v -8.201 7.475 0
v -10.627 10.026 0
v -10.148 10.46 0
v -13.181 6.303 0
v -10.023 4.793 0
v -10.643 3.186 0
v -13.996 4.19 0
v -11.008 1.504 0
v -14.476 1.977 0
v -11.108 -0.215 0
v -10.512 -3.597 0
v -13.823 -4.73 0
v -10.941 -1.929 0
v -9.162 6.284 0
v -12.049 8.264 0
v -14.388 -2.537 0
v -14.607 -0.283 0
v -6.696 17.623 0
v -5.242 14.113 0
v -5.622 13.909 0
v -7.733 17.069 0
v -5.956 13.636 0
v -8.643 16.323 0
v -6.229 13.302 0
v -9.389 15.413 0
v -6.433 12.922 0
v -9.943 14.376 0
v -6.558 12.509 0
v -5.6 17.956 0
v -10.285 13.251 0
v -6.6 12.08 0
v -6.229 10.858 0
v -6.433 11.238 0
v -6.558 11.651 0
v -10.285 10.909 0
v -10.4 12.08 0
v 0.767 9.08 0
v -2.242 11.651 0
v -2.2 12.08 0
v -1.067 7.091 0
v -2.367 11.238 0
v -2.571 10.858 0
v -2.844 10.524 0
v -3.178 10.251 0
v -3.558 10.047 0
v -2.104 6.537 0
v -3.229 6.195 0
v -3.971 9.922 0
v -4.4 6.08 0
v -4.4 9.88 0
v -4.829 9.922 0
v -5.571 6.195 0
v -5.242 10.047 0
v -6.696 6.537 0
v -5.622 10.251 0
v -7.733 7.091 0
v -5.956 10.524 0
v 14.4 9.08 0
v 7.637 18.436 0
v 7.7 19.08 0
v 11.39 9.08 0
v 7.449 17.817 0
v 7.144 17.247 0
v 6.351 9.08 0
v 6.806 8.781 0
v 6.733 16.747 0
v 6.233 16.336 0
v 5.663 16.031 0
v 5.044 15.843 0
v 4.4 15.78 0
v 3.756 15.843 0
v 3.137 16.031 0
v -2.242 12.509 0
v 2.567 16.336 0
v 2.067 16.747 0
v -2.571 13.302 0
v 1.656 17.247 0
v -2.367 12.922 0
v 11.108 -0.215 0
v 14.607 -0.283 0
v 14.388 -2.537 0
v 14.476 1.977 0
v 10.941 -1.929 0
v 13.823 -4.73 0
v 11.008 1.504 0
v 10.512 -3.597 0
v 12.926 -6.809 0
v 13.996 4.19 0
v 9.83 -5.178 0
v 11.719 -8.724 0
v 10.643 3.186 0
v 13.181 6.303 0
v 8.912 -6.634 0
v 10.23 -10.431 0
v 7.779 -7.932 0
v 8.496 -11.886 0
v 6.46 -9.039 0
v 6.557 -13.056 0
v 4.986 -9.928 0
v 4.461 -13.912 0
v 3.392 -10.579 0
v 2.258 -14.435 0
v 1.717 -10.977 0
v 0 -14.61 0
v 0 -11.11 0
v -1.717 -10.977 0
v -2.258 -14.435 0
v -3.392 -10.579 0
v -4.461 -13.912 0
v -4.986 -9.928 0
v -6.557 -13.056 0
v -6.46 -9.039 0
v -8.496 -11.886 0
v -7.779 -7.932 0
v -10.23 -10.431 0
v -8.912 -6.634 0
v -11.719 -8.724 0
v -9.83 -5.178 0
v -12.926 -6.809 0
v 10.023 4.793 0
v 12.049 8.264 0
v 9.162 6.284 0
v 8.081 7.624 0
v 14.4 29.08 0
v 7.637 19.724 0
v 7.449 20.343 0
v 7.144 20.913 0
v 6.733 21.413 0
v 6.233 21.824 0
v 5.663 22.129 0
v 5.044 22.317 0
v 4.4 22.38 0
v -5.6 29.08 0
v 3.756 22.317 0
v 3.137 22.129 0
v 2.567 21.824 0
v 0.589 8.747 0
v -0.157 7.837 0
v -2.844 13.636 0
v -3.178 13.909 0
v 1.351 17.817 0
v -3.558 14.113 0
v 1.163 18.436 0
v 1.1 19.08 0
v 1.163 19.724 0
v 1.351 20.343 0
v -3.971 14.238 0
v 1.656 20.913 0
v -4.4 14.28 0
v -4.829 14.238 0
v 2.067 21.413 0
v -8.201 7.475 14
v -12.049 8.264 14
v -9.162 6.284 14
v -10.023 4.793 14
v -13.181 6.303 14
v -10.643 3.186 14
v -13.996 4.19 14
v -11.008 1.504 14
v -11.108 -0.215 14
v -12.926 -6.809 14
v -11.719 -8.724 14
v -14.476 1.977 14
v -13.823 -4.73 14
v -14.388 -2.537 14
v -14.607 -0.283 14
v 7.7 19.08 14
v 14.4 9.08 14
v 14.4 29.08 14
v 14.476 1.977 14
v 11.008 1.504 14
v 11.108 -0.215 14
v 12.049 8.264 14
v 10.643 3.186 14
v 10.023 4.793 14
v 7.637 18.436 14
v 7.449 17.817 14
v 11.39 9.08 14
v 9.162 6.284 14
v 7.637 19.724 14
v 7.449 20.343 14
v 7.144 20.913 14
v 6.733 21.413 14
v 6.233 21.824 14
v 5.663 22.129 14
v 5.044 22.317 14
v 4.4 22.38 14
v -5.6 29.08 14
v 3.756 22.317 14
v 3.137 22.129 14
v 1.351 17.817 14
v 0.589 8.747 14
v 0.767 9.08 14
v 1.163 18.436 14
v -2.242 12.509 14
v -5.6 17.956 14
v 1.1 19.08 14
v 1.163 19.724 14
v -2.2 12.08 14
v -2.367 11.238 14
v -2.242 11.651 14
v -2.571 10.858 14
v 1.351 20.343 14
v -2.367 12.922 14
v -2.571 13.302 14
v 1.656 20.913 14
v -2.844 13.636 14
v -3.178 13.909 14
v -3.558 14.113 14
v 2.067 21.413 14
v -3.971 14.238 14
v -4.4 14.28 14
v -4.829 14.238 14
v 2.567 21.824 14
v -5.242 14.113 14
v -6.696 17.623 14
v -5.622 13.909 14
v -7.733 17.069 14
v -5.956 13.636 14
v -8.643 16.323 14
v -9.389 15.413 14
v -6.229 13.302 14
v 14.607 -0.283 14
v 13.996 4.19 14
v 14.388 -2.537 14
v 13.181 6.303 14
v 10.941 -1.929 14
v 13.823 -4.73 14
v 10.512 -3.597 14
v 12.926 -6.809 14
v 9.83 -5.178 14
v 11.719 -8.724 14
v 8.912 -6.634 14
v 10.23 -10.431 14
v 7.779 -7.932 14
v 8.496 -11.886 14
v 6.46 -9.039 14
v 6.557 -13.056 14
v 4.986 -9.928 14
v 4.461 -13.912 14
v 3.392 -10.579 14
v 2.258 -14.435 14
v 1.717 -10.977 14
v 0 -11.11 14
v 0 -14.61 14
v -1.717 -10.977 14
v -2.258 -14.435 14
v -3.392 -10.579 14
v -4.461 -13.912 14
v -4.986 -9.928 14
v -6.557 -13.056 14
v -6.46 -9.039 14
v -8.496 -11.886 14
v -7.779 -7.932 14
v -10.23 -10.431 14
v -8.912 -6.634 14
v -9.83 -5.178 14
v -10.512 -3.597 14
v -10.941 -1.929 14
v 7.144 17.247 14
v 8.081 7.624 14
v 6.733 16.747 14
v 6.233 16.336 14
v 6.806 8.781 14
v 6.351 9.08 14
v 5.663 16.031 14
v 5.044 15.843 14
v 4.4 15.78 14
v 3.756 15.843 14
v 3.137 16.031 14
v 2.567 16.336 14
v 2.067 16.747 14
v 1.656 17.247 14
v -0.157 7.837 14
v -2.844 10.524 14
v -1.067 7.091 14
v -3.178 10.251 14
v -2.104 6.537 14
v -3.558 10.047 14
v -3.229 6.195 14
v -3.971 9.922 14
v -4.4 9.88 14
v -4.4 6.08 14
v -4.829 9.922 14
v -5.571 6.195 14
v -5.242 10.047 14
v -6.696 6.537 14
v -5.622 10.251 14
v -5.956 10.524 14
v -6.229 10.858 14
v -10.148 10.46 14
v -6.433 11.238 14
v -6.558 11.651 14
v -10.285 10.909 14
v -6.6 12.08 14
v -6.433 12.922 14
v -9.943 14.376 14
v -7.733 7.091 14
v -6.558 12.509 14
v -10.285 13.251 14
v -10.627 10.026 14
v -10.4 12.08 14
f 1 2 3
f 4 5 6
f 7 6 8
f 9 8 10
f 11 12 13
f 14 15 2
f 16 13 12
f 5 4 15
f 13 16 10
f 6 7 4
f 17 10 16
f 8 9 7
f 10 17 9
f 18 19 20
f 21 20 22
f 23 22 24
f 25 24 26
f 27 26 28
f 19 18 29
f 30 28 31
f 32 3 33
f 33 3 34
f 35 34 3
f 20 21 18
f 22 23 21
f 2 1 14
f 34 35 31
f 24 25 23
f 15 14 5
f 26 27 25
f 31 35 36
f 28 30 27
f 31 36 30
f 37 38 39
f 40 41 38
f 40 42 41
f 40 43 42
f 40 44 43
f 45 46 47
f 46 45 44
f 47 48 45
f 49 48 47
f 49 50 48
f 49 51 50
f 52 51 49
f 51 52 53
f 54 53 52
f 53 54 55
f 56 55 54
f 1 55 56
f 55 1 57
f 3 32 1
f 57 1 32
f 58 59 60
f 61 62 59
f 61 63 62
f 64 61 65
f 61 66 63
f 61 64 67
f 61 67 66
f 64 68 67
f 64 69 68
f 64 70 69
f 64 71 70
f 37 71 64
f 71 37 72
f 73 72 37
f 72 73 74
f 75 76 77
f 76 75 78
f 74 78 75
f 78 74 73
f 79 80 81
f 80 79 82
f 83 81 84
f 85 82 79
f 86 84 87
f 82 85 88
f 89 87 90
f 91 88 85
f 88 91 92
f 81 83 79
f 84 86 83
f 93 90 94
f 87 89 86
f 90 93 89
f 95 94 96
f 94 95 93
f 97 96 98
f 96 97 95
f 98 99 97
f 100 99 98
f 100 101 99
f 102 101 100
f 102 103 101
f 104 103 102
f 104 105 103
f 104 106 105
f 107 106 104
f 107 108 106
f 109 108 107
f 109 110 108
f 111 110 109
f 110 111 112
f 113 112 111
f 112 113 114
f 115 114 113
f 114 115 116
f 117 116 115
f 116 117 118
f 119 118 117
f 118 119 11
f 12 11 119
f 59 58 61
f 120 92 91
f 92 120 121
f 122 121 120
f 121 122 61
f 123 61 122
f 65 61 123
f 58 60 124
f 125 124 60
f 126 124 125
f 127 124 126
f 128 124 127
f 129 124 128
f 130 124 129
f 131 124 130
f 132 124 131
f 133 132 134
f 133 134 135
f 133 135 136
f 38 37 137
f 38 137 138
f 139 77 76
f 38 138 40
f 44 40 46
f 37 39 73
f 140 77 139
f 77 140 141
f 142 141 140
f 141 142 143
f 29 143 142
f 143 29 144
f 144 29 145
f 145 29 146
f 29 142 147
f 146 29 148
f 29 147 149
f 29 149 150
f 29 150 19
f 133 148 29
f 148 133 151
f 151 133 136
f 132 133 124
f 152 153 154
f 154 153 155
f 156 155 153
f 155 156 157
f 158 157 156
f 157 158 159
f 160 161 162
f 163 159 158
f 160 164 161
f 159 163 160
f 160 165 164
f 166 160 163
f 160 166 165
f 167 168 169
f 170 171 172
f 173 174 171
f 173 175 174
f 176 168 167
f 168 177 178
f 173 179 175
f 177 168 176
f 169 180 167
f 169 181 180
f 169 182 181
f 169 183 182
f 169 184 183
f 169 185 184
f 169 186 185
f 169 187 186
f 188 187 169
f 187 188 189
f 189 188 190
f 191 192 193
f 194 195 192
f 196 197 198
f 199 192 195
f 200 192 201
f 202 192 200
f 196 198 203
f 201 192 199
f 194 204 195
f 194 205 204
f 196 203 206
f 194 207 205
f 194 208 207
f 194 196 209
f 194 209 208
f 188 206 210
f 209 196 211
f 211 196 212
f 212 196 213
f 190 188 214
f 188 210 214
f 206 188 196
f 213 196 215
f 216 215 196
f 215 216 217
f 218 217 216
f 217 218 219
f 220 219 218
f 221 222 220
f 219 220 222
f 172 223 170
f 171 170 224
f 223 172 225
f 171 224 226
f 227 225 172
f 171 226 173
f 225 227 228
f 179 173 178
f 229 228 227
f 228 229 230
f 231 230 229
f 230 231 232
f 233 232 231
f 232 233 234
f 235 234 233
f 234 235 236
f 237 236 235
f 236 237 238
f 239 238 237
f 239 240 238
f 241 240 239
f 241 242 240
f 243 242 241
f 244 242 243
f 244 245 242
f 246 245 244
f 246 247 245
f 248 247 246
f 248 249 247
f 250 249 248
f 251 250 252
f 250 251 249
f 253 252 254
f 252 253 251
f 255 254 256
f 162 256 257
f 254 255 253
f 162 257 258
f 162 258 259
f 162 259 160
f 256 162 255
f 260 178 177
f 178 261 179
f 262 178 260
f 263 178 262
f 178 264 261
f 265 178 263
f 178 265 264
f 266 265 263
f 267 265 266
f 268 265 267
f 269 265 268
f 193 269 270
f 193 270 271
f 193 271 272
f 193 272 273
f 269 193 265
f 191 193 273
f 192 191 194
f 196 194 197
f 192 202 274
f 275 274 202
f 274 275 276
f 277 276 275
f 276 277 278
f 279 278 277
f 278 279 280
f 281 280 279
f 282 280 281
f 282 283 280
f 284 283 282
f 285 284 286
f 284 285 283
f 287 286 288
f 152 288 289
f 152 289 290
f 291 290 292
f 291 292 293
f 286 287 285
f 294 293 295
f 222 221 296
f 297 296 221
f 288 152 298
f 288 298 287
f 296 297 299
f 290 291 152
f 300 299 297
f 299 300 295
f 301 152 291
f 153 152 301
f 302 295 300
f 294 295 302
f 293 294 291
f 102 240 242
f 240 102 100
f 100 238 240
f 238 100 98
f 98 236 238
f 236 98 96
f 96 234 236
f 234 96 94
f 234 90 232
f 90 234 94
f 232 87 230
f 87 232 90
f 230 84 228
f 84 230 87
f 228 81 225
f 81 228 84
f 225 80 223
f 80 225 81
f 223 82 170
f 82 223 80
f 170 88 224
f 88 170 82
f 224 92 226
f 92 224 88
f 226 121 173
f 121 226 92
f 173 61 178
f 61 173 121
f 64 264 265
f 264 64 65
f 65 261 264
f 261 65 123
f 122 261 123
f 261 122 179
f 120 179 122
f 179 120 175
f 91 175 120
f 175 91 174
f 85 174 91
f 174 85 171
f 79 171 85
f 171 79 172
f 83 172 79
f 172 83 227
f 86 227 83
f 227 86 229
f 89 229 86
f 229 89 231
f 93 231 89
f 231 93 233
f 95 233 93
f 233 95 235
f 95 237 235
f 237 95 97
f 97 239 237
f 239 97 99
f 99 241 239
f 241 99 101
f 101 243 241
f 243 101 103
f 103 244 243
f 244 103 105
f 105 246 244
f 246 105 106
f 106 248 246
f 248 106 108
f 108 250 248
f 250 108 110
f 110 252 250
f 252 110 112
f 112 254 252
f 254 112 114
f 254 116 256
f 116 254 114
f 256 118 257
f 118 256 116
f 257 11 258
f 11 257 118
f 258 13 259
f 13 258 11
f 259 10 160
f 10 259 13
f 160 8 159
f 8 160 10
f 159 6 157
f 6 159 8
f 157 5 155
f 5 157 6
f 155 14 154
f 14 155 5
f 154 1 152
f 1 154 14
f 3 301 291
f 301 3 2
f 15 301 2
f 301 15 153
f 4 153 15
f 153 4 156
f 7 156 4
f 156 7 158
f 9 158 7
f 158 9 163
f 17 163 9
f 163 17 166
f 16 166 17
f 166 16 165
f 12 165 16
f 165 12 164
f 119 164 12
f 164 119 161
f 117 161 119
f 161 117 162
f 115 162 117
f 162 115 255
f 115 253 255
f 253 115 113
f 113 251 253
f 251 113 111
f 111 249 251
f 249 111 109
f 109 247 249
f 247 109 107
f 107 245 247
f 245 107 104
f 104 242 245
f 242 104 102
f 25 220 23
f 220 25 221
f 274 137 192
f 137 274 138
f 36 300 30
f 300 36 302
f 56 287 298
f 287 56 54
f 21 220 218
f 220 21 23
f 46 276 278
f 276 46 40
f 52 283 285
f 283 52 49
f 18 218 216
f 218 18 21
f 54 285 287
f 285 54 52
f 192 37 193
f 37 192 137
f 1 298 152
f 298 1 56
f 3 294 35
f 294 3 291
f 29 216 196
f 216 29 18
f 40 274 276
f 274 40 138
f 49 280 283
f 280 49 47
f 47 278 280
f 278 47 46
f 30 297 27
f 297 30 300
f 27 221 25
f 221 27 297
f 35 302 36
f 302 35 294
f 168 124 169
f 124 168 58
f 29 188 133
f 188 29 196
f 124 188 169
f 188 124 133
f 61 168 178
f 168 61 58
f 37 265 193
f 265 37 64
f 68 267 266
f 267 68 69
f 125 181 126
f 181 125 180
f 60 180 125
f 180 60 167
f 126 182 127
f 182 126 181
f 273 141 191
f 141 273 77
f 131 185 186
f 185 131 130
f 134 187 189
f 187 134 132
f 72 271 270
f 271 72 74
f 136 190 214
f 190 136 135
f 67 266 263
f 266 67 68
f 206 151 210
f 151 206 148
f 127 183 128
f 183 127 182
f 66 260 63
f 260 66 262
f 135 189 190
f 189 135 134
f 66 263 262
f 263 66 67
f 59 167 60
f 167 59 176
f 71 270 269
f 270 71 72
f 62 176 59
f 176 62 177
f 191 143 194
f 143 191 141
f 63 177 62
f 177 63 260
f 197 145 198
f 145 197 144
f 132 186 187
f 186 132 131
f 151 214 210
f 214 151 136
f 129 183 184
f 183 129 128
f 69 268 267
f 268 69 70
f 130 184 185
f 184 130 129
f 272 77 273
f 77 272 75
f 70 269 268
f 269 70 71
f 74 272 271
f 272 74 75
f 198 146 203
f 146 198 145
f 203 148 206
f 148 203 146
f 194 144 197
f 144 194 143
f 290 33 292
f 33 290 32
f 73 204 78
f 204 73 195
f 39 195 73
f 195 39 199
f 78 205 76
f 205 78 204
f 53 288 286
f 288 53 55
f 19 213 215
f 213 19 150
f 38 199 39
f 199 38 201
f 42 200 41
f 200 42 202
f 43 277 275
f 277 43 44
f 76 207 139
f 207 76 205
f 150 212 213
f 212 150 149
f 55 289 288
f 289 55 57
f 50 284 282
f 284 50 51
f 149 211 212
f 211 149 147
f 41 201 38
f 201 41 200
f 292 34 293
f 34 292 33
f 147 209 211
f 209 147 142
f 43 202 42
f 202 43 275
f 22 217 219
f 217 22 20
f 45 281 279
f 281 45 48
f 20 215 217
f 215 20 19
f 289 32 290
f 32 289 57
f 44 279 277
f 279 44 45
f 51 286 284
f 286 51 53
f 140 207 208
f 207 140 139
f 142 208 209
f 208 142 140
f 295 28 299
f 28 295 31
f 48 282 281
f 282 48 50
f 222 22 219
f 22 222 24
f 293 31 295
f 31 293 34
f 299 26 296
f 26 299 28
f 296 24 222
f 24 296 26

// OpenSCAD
$fn = 32;

// ----------------------------------------------------------------------
// Pipe clamp: 29.22 mm ring, 3.5 mm wall, 14 mm wide
// ----------------------------------------------------------------------

// --- parameters (mm) ---
outer_r = 14.61;          // clamp outside radius
inner_r = 11.11;          // pipe bore radius
band = 3.5;               // band thickness
clamp_w = 14;             // clamp width
opening = 40;             // opening angle between the ends
lug_w = 20;               // lug width
lug_len = 20;             // lug length
bolt_d = 6.6;             // bolt hole
knuckle_d = 12;           // hinge knuckle diameter
pin_d = 4.4;              // hinge pin hole

clamp_profile = [[-4.997, 13.729], [-7.058, 12.792], [-8.95, 11.548], [-10.627, 10.026], [-12.049, 8.264], [-13.181, 6.303], [-13.996, 4.19], [-14.476, 1.977], [-14.607, -0.283], [-14.388, -2.537], [-13.823, -4.73], [-12.926, -6.809], [-11.719, -8.724], [-10.23, -10.431], [-8.496, -11.886], [-6.557, -13.056], [-4.461, -13.912], [-2.258, -14.435], [0, -14.61], [2.258, -14.435], [4.461, -13.912], [6.557, -13.056], [8.496, -11.886], [10.23, -10.431], [11.719, -8.724], [12.926, -6.809], [13.823, -4.73], [14.388, -2.537], [14.607, -0.283], [14.476, 1.977], [13.996, 4.19], [13.181, 6.303], [12.049, 8.264], [10.627, 10.026], [8.95, 11.548], [7.058, 12.792], [4.997, 13.729], [3.8, 10.44], [5.367, 9.727], [6.806, 8.781], [8.081, 7.624], [9.162, 6.284], [10.023, 4.793], [10.643, 3.186], [11.008, 1.504], [11.108, -0.215], [10.941, -1.929], [10.512, -3.597], [9.83, -5.178], [8.912, -6.634], [7.779, -7.932], [6.46, -9.039], [4.986, -9.928], [3.392, -10.579], [1.717, -10.977], [0, -11.11], [-1.717, -10.977], [-3.392, -10.579], [-4.986, -9.928], [-6.46, -9.039], [-7.779, -7.932], [-8.912, -6.634], [-9.83, -5.178], [-10.512, -3.597], [-10.941, -1.929], [-11.108, -0.215], [-11.008, 1.504], [-10.643, 3.186], [-10.023, 4.793], [-9.162, 6.284], [-8.081, 7.624], [-6.806, 8.781], [-5.367, 9.727], [-3.8, 10.44]];

difference() {
  union() {
    linear_extrude(height = clamp_w) polygon(clamp_profile);
    /* hinge knuckle, sunk 2 mm into the band end */
    translate([-4.4, 12.08, 0]) cylinder(h = clamp_w, d = knuckle_d);
    /* bolt lug on the other end */
    translate([-5.6, 9.08, 0]) cube([lug_w, 20, clamp_w]);
  }
  translate([4.4, 19.08, -2.5]) cylinder(h = clamp_w + 5, d = bolt_d);
  translate([-4.4, 12.08, -2.5]) cylinder(h = clamp_w + 5, d = pin_d);
}
